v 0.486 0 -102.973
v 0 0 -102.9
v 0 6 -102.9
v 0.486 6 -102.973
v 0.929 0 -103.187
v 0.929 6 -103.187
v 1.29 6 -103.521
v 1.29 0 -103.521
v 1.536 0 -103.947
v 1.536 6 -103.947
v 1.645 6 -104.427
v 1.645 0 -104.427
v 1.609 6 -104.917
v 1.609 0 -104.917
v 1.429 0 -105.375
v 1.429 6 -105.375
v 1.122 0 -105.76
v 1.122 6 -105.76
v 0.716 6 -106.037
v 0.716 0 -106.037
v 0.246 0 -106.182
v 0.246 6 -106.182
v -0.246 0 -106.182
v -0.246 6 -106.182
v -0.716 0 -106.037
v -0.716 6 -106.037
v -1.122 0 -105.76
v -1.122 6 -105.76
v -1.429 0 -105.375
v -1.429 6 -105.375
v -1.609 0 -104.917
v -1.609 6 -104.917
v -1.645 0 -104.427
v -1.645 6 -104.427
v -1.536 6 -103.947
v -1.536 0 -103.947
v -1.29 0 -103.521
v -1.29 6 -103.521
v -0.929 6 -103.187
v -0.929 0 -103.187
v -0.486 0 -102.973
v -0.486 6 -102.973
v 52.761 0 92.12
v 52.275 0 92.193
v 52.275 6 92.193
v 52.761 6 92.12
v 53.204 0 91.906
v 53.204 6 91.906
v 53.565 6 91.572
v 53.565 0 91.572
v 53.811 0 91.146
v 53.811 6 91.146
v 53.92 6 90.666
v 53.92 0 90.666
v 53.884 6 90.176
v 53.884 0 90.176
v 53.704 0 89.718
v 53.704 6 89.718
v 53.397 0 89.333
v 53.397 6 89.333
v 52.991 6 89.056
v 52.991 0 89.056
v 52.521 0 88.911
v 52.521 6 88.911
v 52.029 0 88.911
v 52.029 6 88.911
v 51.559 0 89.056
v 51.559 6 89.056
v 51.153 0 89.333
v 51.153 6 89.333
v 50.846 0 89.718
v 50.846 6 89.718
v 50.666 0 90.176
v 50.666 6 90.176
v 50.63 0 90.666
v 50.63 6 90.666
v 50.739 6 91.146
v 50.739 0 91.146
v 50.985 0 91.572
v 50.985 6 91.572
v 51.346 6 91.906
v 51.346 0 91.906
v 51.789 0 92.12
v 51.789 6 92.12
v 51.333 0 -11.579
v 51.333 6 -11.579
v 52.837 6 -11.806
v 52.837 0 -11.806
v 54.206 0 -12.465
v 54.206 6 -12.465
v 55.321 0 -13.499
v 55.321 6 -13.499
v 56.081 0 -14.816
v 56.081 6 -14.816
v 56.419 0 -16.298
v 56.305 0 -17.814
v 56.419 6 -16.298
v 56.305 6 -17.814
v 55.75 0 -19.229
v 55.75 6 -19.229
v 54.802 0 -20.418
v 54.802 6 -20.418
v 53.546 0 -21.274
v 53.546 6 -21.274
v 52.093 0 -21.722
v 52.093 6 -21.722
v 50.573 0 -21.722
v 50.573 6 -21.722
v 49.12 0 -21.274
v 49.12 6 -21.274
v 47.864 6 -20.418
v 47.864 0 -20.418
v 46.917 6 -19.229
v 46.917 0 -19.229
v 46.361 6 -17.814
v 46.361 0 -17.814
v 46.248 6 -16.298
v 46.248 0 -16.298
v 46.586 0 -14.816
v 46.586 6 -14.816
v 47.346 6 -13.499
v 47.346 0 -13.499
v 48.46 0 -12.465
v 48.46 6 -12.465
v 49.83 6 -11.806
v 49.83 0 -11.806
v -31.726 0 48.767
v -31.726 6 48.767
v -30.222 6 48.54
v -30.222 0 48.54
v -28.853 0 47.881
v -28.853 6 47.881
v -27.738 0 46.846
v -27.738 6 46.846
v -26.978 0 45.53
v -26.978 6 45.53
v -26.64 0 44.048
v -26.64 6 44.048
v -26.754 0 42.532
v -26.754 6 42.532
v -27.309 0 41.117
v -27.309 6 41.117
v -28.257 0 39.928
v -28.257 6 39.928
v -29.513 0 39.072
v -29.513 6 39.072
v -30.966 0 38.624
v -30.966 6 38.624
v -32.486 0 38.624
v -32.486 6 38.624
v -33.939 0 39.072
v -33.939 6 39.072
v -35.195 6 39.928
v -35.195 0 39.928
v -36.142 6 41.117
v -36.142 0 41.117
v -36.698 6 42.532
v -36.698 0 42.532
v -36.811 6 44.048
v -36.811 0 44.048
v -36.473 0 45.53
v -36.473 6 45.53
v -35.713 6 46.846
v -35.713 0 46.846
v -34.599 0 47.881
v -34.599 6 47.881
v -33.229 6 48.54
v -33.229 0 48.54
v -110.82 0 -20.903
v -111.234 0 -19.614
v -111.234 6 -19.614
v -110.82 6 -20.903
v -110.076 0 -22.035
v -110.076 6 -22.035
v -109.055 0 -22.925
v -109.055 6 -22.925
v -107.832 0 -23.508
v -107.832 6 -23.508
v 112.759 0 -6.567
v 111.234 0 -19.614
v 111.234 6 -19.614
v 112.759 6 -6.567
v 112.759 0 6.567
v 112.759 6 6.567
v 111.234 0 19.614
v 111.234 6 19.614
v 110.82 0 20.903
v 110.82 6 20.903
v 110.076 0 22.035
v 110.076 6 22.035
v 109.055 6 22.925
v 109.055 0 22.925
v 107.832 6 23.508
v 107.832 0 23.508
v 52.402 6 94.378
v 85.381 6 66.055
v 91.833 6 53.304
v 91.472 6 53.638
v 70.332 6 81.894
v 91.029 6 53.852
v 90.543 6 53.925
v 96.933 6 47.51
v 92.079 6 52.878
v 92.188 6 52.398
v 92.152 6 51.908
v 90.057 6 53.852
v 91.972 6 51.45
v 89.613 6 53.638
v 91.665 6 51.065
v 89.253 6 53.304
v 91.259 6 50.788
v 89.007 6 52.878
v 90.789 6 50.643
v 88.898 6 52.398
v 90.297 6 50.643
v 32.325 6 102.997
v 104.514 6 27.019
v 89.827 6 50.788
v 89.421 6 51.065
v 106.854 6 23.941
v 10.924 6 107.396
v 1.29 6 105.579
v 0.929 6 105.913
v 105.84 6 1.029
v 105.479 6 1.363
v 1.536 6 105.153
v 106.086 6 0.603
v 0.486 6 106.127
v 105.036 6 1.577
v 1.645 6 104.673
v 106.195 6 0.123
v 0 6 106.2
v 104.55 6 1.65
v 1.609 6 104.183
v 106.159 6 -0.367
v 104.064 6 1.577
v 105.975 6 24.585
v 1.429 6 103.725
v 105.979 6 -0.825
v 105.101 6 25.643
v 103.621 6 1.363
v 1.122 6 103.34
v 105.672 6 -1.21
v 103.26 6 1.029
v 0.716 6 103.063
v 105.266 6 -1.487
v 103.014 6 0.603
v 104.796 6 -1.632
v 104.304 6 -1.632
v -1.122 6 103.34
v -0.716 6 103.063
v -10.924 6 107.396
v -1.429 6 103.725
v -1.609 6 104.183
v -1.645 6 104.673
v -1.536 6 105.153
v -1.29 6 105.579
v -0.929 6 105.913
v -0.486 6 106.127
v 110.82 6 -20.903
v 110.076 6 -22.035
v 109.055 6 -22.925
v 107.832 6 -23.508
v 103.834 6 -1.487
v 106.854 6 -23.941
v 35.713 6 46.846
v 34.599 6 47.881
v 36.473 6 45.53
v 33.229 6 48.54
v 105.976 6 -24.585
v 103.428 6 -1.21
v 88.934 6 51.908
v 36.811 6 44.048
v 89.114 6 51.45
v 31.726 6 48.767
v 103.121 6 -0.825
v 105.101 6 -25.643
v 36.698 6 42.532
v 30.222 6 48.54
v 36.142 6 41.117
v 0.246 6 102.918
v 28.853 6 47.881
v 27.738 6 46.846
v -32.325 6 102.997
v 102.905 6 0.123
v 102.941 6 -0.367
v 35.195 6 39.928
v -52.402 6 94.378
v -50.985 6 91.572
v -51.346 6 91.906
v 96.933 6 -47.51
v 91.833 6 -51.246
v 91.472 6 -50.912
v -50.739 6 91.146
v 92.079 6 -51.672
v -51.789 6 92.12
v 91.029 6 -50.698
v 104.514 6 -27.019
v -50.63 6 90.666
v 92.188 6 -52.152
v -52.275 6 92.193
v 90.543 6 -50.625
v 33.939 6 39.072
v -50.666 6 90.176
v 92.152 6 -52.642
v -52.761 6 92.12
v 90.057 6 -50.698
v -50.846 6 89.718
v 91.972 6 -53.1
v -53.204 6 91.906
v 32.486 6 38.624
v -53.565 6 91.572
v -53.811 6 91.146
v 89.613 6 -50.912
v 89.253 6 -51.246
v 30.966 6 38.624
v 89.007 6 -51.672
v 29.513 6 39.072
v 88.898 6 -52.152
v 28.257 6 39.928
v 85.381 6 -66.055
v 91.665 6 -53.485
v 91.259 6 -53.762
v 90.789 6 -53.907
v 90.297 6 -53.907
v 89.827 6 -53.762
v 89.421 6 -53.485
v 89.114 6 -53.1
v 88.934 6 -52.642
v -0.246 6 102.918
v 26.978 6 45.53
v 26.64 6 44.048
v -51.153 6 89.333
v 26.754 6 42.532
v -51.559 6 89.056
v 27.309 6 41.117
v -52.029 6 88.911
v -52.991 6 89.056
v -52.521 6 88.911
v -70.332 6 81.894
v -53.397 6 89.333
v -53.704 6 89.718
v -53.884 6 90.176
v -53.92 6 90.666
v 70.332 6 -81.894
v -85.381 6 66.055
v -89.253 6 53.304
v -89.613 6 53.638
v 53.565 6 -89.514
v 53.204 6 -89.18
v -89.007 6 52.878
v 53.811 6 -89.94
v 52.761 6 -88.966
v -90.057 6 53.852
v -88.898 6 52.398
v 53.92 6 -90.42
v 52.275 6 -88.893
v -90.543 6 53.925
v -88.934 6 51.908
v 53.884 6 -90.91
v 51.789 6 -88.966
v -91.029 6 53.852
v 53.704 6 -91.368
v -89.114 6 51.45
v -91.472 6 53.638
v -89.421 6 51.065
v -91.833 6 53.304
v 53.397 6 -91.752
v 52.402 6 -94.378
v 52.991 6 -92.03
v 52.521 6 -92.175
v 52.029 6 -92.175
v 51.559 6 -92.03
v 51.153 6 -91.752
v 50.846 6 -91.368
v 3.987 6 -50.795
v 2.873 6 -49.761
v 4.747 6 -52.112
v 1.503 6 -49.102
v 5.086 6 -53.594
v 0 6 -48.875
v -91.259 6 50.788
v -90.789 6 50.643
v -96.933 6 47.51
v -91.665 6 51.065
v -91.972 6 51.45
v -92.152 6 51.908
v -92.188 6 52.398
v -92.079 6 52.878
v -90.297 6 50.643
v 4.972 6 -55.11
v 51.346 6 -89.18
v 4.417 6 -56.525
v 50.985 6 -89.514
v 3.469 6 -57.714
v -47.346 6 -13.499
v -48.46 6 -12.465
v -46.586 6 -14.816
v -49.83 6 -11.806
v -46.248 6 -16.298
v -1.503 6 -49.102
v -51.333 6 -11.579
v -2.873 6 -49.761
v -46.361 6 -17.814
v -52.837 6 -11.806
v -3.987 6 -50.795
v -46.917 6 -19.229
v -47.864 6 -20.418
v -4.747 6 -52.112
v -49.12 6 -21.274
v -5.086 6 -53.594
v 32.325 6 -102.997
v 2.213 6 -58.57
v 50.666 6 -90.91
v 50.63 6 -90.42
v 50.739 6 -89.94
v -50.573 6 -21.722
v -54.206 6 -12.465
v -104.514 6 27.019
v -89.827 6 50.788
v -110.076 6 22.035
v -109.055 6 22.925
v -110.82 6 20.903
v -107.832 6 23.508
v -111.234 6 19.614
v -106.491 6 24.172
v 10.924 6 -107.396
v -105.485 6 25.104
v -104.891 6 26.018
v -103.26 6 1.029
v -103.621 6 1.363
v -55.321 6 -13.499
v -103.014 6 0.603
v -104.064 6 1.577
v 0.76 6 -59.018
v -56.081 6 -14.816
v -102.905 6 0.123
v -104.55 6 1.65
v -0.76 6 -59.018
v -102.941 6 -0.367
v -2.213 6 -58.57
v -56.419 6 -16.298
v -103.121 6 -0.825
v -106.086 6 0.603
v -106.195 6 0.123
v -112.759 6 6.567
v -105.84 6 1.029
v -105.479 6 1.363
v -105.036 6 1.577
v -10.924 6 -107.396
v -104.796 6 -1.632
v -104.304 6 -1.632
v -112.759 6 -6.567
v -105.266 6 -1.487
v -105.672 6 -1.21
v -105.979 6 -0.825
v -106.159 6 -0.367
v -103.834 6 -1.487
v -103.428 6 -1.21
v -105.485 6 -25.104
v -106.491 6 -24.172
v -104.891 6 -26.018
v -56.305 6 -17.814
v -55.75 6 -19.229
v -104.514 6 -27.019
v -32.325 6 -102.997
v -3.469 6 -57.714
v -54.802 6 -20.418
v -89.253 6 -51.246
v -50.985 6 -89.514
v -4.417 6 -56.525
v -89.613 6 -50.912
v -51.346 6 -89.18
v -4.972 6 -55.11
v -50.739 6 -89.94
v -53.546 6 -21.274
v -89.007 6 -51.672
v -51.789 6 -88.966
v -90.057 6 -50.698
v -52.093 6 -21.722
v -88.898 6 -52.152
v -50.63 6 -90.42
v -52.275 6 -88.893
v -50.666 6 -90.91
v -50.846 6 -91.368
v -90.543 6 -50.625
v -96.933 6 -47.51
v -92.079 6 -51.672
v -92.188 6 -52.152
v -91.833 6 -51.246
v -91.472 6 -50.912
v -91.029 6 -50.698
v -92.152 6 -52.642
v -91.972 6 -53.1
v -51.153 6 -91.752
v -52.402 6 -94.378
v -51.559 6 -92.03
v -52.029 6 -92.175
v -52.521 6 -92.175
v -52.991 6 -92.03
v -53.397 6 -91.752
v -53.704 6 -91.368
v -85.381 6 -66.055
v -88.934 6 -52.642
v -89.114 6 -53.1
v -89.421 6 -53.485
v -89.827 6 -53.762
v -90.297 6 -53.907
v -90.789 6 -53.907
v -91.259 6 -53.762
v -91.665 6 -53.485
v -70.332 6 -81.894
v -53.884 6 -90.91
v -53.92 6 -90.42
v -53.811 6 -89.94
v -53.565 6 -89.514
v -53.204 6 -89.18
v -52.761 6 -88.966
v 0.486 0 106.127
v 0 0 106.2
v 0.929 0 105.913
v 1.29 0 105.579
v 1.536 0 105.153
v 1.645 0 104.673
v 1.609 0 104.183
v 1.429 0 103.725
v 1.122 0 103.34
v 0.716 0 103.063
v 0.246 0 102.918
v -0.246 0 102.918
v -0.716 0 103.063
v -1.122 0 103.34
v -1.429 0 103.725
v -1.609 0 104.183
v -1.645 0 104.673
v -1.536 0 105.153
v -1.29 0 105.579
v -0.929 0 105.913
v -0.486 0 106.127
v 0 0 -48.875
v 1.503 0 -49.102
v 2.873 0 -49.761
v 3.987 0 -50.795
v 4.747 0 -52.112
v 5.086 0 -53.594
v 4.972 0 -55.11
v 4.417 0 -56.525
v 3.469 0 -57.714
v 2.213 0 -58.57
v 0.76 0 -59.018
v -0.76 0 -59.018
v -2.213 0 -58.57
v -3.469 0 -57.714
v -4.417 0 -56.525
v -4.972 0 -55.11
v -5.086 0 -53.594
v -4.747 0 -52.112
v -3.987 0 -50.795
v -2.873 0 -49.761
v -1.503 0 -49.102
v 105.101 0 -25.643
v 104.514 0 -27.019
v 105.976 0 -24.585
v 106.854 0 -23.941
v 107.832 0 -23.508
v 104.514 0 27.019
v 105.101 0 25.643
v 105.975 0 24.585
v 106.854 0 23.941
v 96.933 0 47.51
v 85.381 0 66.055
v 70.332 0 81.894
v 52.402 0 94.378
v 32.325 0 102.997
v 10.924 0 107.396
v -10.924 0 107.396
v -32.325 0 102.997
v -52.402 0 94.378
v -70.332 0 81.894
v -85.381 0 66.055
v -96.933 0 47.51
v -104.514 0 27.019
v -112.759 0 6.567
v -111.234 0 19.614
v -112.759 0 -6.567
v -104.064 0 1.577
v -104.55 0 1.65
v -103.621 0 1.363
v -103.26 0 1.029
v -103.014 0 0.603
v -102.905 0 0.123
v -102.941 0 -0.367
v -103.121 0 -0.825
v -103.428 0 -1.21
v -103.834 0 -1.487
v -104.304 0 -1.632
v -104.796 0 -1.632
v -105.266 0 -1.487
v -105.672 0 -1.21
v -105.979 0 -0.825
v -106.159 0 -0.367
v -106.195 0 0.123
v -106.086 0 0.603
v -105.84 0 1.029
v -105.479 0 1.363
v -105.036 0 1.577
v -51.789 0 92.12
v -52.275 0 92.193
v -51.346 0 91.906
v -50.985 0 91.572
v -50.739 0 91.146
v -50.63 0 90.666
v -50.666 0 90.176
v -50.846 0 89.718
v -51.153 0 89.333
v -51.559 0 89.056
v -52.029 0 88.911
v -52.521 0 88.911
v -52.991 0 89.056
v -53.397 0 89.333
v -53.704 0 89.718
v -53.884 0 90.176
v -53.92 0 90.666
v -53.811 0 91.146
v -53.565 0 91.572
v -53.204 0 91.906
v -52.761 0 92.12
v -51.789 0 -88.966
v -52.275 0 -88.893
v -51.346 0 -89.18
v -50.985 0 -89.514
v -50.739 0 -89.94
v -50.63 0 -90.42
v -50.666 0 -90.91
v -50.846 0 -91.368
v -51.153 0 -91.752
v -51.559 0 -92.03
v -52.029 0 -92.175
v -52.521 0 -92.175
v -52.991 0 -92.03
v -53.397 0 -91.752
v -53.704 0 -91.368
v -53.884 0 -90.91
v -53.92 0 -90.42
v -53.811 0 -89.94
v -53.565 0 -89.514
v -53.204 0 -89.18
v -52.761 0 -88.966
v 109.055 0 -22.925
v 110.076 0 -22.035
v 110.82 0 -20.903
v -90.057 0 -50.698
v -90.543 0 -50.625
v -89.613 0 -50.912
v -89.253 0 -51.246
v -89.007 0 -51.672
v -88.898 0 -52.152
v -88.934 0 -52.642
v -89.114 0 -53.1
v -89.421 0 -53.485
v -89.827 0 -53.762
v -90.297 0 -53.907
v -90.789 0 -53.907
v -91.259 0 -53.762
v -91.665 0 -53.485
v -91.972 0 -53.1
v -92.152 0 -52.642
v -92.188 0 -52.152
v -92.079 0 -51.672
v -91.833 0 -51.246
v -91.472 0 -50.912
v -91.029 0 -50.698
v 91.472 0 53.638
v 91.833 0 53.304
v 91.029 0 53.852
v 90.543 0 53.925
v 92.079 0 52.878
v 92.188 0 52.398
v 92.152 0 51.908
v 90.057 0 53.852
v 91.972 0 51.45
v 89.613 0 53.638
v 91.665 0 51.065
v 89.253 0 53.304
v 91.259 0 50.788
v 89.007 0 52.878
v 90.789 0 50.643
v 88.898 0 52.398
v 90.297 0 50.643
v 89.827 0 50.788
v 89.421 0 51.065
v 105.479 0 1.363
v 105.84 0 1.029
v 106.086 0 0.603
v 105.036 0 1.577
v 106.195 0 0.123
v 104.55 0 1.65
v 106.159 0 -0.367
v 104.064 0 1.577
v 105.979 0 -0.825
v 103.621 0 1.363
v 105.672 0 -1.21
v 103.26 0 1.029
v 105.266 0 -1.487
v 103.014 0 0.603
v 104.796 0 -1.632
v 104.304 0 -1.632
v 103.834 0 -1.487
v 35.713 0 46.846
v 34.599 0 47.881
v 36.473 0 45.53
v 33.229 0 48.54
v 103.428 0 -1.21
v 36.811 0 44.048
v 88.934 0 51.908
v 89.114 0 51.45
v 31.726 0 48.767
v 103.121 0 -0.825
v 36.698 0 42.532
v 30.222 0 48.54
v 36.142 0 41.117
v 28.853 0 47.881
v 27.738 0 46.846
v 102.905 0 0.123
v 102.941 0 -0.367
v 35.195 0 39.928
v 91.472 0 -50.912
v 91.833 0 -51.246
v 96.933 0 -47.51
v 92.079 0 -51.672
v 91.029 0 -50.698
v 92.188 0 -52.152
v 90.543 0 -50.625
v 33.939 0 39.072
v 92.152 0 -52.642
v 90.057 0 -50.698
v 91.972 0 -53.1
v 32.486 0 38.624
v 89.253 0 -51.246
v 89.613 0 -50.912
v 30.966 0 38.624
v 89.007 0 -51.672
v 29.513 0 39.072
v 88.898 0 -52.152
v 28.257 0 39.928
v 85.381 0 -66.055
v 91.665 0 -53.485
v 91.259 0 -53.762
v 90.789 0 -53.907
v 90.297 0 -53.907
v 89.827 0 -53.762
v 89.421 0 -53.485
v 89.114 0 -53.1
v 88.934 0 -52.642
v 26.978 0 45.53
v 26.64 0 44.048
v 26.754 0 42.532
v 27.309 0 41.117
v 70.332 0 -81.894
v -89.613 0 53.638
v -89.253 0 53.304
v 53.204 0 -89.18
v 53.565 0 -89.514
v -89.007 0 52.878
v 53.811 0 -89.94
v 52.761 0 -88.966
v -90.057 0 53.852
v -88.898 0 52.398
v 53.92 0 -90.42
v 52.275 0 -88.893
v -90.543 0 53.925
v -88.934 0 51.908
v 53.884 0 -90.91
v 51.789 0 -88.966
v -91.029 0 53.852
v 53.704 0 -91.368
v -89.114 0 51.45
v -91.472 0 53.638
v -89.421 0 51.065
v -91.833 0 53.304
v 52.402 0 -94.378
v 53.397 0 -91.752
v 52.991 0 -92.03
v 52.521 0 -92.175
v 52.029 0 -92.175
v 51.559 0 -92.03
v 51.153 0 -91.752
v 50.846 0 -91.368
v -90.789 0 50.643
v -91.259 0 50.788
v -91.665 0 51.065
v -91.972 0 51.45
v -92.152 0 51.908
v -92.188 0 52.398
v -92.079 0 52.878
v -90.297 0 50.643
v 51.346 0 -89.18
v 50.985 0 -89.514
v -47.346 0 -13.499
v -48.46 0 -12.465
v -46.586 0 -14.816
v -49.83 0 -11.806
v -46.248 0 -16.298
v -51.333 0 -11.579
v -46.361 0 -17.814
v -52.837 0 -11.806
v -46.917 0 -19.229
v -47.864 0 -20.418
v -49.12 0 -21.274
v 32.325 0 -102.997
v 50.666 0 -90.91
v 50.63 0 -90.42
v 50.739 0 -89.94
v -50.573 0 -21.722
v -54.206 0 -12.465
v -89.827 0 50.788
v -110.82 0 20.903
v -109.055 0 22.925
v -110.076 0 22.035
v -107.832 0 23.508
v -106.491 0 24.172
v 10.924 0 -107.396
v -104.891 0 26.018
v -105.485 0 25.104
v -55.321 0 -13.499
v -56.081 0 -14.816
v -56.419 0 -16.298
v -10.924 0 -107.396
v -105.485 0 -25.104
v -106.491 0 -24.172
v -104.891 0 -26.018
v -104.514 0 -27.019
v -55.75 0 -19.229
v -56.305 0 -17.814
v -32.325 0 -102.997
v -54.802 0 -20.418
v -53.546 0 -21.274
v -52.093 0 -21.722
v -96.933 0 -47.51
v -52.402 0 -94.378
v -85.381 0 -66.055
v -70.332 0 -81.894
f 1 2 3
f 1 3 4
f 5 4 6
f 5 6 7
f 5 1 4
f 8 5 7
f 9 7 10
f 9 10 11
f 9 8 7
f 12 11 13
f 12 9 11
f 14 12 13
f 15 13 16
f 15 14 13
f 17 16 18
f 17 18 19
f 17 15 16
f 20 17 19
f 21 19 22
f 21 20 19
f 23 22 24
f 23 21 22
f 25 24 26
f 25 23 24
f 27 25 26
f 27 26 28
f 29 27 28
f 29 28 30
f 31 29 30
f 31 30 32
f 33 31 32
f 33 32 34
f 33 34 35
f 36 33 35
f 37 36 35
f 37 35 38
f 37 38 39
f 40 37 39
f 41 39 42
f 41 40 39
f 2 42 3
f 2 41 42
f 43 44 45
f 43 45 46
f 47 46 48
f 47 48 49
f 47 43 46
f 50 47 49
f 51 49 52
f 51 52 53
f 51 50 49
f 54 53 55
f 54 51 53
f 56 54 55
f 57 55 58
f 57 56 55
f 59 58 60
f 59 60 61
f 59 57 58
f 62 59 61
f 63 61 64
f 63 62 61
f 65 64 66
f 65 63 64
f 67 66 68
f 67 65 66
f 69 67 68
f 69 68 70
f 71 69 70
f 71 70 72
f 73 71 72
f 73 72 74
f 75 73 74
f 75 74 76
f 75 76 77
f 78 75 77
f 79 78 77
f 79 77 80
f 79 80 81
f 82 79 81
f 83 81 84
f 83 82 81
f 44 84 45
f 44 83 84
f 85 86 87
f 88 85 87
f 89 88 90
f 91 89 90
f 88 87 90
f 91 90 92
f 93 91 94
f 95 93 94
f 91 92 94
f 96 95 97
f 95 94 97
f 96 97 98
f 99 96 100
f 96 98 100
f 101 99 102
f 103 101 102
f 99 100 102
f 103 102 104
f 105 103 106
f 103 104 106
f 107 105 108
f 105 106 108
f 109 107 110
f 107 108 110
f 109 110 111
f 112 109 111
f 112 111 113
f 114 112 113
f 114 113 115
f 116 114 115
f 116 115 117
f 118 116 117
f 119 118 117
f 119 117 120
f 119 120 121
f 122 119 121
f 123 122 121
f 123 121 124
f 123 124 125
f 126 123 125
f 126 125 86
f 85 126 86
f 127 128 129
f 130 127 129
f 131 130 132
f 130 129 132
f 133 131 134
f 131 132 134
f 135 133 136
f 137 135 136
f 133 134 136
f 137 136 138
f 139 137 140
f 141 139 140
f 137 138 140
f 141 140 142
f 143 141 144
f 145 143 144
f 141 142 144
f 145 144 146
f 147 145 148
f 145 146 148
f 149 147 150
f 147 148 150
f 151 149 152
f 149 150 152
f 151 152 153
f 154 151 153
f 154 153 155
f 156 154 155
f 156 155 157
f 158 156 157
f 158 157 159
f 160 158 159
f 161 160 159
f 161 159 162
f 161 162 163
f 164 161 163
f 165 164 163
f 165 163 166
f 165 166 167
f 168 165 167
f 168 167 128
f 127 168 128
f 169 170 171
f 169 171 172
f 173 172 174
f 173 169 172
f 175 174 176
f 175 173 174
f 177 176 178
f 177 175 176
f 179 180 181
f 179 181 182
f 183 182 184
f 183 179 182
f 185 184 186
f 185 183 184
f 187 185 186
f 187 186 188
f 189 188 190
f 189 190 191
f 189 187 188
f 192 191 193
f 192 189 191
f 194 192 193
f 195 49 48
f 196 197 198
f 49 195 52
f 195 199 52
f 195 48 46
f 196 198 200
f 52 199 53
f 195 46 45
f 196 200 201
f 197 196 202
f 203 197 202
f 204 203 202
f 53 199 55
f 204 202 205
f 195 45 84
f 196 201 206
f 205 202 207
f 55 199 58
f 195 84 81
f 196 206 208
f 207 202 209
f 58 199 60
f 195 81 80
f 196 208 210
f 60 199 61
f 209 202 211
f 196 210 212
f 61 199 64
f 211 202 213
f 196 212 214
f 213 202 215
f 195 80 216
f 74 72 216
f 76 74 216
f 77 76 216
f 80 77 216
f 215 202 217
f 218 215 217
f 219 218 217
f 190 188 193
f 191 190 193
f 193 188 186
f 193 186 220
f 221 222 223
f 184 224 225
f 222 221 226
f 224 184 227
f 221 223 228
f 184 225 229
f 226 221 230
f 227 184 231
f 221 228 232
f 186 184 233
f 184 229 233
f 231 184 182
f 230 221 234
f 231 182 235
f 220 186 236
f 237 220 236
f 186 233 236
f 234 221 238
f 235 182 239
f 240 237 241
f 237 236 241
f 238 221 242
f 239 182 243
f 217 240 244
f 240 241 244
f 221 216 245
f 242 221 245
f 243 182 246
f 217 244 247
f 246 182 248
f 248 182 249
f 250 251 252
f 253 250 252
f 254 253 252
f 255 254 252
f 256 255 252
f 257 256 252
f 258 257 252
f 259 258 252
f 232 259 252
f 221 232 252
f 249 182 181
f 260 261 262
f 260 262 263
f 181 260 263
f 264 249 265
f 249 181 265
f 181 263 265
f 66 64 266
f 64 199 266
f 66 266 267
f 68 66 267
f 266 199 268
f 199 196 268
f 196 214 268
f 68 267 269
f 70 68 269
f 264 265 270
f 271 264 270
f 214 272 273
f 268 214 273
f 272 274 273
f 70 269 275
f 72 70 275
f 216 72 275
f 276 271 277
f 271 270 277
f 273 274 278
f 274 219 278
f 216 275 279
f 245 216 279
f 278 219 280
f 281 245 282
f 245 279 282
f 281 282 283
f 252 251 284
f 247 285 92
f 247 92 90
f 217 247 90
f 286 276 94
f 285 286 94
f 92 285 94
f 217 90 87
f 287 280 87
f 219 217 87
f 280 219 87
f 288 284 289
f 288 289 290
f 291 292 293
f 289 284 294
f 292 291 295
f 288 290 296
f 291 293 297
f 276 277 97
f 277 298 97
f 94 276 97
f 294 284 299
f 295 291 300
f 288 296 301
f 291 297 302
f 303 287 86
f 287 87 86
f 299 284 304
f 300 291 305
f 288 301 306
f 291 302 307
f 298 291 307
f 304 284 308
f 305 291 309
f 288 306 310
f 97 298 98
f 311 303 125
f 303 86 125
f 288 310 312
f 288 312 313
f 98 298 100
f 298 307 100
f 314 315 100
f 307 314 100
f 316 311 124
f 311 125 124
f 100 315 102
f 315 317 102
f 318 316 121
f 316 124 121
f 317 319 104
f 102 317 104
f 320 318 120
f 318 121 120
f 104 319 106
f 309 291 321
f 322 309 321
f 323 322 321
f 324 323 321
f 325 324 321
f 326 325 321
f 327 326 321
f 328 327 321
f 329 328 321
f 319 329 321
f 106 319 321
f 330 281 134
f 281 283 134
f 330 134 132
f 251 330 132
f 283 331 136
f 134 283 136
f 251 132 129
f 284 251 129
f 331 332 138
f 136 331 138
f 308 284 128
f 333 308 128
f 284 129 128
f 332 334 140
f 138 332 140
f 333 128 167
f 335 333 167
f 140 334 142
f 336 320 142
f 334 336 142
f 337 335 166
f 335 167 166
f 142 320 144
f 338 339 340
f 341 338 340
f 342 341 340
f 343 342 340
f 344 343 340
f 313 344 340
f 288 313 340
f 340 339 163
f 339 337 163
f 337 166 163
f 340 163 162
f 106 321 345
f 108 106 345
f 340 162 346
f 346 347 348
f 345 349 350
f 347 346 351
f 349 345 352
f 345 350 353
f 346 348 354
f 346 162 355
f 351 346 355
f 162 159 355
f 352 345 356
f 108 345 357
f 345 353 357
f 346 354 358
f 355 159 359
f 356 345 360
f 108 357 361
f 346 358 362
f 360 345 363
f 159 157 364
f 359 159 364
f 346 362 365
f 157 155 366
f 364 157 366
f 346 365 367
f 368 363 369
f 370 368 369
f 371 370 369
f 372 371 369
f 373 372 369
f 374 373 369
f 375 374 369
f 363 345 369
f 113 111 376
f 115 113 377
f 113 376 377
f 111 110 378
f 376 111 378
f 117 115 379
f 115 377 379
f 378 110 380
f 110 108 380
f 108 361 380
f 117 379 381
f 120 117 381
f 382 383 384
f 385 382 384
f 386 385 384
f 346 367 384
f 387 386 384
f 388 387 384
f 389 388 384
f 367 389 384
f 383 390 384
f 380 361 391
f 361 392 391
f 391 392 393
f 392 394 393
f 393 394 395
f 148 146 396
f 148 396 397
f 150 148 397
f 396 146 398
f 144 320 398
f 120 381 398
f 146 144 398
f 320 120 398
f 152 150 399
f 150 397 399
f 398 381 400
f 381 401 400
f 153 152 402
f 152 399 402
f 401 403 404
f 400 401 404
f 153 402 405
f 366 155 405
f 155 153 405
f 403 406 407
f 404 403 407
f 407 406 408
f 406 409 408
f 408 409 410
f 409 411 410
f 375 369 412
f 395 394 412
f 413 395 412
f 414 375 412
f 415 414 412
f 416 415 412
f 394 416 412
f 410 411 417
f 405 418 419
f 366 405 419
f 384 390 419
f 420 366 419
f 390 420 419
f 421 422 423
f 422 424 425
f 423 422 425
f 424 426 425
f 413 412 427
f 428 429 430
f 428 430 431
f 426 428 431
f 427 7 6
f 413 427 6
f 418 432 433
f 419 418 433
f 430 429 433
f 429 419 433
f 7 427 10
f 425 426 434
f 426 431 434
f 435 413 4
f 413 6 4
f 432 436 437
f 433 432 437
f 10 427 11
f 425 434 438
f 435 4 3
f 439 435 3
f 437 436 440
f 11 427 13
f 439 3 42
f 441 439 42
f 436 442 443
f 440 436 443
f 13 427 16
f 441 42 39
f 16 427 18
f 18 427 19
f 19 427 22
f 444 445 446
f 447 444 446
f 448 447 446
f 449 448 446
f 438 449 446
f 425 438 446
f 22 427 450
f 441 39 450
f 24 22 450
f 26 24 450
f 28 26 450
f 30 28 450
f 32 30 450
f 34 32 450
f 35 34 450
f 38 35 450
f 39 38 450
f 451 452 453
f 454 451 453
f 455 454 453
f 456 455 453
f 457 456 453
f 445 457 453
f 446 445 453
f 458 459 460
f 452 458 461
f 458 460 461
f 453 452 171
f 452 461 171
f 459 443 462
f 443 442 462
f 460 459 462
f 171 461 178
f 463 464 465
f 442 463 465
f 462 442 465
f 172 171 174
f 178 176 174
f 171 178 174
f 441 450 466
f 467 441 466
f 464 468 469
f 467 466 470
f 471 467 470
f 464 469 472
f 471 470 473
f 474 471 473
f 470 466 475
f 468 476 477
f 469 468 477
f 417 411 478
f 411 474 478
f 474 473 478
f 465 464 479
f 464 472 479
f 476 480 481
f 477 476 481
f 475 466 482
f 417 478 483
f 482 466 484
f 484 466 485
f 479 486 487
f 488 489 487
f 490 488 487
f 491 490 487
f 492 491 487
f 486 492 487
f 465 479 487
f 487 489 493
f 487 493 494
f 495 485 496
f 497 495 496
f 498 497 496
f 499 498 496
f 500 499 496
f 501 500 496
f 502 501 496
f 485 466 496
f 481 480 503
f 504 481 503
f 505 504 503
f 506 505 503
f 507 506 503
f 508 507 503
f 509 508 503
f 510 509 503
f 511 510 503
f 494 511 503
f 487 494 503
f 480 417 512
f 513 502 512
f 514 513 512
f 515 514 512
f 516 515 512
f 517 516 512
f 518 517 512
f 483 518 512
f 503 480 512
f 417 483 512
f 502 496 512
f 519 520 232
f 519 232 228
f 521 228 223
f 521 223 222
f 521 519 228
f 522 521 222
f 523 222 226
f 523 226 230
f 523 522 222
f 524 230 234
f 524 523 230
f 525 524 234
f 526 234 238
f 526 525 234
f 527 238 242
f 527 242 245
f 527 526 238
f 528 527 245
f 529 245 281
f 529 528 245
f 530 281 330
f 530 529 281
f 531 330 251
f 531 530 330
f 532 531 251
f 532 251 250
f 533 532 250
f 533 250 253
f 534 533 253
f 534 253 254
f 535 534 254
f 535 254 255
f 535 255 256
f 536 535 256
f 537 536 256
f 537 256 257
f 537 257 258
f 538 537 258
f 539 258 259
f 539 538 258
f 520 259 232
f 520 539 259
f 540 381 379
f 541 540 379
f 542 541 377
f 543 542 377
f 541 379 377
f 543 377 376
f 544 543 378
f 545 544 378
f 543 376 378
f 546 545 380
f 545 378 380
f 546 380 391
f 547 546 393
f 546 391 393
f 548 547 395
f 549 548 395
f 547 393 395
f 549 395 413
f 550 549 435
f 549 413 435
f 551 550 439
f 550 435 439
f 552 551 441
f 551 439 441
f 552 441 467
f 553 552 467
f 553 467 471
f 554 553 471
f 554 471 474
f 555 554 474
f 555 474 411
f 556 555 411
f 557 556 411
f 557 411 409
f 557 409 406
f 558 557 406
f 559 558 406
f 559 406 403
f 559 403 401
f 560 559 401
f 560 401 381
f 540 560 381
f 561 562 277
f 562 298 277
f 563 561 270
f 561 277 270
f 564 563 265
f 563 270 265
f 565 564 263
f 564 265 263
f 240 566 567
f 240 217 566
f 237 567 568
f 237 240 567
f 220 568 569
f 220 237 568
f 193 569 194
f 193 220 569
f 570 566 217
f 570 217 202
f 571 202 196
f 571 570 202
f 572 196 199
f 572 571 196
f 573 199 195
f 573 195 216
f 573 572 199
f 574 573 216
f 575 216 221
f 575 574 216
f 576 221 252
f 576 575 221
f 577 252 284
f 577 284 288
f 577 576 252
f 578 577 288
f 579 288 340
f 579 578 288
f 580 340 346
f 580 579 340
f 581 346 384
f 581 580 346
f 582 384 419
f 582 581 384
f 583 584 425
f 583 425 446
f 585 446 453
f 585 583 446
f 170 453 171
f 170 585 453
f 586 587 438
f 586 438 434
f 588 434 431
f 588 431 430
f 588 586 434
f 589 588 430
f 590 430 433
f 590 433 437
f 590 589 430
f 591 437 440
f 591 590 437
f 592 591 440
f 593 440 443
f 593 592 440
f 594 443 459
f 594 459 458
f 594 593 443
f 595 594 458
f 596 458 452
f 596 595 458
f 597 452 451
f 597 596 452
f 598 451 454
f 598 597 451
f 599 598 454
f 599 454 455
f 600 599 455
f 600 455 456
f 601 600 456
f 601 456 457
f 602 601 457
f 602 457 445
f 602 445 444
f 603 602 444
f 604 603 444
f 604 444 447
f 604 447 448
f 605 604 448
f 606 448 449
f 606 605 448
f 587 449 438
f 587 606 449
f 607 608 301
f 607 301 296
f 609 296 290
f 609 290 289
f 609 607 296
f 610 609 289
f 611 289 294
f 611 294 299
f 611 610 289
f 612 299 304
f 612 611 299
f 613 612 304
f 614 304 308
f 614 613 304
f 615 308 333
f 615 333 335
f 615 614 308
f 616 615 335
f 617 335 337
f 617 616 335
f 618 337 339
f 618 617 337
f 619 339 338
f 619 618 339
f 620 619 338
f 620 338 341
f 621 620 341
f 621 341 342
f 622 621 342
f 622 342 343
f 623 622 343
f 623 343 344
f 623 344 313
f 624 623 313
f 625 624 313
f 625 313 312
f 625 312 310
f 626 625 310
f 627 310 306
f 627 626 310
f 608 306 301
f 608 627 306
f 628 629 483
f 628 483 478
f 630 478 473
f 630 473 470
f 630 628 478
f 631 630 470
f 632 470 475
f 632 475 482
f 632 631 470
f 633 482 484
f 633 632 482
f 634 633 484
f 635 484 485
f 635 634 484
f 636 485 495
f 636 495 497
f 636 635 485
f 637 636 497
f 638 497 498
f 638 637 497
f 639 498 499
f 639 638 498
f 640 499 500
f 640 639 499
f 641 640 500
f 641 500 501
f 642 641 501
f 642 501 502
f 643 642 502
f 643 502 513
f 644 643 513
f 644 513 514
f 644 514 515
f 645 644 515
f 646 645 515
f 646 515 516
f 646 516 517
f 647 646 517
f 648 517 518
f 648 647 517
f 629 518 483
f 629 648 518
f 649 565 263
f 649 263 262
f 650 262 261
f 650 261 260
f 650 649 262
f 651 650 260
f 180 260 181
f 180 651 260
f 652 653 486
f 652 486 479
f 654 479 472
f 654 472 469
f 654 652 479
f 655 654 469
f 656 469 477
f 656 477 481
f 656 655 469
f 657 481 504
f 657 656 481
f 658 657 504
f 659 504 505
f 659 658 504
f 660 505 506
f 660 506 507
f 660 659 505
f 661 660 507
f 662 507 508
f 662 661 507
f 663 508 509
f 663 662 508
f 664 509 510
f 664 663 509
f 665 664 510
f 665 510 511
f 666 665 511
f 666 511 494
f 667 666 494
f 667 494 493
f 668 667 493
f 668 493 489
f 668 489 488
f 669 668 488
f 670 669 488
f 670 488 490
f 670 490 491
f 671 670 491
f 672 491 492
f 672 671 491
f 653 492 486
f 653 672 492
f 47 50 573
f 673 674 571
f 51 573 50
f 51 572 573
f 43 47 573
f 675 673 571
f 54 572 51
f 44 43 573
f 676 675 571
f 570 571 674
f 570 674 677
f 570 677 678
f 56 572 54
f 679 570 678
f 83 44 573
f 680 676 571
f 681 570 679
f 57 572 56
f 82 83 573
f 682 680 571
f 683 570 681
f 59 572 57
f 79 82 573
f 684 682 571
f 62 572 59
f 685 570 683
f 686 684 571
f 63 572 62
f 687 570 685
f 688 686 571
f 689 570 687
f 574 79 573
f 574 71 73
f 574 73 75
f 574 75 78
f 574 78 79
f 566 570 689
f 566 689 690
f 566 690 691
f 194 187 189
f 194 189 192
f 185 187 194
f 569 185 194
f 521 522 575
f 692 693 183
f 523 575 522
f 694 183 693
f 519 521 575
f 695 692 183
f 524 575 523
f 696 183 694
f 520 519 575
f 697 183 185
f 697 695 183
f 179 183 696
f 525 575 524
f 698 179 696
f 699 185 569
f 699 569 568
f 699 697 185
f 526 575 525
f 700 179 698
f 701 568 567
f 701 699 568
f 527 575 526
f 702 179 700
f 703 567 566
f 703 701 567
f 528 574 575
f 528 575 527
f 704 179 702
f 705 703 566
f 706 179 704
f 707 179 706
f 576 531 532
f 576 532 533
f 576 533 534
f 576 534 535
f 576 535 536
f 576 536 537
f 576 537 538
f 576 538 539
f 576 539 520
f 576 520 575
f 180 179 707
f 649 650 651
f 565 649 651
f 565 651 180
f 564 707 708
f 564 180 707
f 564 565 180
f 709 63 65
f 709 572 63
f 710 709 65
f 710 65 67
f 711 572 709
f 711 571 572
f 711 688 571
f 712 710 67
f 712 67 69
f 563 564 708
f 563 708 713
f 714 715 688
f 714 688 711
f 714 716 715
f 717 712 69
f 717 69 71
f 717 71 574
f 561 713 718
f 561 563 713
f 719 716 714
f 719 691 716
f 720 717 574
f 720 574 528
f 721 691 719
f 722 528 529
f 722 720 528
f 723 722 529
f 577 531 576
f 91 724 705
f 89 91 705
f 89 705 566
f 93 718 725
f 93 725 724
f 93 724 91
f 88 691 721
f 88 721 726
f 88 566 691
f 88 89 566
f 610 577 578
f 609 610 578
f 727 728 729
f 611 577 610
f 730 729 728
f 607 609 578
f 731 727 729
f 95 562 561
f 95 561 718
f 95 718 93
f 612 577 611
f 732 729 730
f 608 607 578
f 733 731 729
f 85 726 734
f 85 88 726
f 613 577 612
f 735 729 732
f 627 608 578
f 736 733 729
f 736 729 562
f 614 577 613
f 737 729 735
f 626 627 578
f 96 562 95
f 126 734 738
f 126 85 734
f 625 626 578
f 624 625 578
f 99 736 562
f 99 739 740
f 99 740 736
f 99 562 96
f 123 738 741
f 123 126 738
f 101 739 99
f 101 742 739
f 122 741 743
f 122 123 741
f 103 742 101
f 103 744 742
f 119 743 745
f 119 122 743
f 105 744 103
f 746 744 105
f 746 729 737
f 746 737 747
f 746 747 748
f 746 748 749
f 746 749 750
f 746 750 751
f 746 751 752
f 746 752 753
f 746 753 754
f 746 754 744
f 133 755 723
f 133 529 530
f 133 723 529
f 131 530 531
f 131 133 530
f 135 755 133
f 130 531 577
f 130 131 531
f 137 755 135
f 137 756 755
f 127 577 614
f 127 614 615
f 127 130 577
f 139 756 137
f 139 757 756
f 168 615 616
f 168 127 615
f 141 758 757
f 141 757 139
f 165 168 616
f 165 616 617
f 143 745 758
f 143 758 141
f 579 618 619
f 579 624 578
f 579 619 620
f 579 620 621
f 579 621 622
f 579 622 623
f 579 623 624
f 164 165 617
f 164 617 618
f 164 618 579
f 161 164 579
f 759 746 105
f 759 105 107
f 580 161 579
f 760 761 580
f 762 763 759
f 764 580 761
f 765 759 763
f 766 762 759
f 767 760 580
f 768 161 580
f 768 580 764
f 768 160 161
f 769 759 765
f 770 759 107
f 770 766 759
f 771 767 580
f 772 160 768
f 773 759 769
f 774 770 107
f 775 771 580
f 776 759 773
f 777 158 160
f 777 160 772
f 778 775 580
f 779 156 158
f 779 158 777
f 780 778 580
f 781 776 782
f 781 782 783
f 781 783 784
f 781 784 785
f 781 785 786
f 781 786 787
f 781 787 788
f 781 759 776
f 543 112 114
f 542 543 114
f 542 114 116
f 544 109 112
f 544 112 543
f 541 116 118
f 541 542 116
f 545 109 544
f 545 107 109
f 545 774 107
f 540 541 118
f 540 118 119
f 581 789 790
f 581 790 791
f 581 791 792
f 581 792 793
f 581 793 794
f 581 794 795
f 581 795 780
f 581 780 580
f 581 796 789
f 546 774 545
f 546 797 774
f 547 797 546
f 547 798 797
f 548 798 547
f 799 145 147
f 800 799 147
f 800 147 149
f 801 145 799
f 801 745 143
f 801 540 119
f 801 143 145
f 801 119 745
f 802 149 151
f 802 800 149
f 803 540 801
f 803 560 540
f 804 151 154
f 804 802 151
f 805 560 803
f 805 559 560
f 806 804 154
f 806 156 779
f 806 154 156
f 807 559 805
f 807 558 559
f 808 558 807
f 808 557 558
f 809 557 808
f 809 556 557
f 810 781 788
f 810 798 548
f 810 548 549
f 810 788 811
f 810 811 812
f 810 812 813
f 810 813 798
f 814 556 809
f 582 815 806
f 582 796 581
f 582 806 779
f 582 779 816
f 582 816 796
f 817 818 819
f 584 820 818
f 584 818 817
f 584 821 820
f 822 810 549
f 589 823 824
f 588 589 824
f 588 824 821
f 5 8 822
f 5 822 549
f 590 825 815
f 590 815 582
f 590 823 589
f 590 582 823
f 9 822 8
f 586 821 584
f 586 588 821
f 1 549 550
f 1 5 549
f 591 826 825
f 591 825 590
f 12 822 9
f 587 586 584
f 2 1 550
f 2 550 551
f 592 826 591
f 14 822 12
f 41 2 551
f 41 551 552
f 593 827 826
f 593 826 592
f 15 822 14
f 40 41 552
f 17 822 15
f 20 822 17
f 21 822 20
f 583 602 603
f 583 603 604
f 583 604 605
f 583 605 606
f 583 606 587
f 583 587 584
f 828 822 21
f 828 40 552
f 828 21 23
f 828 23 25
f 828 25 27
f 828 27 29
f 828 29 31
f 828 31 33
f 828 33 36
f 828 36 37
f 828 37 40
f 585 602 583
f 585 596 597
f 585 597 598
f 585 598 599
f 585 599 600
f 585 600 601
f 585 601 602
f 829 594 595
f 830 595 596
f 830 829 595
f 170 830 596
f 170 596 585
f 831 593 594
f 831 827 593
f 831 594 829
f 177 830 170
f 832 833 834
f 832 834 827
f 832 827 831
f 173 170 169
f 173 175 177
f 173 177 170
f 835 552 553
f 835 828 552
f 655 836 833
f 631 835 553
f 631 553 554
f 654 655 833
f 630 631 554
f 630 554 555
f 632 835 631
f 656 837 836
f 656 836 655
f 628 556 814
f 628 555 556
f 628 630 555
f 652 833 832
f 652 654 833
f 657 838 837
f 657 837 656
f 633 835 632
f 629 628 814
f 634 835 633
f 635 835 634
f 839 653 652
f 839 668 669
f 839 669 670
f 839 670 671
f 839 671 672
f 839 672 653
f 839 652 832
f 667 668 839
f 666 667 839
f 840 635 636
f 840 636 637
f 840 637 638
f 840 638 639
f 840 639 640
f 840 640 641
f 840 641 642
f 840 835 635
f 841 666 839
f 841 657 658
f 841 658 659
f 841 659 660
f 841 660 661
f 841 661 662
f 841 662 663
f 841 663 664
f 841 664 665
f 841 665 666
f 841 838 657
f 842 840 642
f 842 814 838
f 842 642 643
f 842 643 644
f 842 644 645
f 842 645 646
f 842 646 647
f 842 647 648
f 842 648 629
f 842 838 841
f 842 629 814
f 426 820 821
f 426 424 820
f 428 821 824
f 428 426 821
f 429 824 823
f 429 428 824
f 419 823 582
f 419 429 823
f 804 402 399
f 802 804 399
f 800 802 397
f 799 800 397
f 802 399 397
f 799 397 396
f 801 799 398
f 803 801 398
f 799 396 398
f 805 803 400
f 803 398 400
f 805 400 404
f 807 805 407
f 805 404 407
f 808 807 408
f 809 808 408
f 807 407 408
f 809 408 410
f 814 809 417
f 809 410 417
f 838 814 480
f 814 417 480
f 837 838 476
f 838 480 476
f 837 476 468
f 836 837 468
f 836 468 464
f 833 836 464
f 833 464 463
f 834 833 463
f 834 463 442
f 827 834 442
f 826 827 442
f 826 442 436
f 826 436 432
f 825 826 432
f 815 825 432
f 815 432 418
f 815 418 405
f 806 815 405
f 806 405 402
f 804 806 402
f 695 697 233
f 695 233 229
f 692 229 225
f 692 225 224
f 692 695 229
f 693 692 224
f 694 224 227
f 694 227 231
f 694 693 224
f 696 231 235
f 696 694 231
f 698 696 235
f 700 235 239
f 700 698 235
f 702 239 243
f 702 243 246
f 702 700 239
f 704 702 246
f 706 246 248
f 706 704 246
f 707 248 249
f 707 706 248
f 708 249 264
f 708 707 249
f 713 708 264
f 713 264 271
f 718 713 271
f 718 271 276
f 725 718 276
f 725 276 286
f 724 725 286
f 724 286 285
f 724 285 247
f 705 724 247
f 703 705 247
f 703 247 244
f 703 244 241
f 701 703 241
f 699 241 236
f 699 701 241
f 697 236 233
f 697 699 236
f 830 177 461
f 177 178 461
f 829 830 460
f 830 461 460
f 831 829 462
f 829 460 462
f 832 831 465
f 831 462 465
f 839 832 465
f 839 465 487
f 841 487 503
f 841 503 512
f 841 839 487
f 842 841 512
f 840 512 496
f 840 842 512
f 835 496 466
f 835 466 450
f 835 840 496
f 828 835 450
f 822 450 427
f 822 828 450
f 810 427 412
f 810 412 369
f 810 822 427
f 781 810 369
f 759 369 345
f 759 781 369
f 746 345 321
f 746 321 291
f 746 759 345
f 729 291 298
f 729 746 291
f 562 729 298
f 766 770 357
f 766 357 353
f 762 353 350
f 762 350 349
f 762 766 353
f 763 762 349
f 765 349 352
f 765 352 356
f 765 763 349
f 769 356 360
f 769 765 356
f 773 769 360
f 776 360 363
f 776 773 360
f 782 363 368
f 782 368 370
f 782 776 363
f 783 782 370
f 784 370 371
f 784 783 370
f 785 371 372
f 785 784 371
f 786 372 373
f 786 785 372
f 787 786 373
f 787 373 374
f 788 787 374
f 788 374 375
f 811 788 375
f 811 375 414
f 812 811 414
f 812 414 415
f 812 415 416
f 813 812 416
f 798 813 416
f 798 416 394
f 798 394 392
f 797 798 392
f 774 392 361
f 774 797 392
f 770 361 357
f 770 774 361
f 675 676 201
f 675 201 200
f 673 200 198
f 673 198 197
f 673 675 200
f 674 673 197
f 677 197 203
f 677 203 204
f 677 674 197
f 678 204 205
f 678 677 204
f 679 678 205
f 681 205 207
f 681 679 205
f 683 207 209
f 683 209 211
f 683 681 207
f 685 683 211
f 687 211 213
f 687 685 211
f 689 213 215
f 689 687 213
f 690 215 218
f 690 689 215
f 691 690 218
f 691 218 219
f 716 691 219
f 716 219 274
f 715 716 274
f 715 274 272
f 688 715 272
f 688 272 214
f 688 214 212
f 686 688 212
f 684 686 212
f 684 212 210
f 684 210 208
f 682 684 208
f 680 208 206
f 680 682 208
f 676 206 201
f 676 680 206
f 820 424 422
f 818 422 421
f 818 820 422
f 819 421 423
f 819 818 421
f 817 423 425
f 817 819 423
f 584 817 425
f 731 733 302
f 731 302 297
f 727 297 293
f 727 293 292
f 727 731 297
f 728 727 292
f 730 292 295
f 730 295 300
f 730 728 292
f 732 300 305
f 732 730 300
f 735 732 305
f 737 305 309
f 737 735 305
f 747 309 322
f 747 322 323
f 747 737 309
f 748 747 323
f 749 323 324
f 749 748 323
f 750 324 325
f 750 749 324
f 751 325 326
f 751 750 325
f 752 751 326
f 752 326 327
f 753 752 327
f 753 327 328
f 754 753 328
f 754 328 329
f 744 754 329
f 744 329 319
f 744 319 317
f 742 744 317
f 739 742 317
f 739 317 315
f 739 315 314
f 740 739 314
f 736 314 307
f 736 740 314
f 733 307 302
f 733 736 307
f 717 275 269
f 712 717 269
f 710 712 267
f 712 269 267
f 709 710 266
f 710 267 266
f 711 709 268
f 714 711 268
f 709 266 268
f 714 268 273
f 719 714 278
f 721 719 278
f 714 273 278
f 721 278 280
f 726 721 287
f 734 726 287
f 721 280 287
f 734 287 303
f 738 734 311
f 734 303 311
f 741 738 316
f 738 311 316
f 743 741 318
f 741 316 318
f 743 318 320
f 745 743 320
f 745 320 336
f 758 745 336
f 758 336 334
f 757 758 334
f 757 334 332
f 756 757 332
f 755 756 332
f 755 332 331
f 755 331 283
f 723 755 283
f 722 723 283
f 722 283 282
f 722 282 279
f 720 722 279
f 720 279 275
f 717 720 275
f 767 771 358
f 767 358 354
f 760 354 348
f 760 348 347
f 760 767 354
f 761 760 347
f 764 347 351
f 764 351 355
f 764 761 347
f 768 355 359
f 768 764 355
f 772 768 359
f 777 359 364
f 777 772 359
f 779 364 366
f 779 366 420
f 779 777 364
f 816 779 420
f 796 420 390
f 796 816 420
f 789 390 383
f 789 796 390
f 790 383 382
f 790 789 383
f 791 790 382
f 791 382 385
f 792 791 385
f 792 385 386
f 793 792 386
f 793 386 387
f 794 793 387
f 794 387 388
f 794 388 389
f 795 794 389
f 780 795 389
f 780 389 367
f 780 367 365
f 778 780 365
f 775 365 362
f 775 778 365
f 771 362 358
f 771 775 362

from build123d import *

# Parameters (mm, degrees)
SKETCH1_R           = 1.65
BOSS_EXTRUDE1_DEPTH = 6
FILLET1_R           = 5
SKETCH2_R           = 5.1
CUT_EXTRUDE1_DEPTH  = 157.355060824


with BuildPart() as part:
    # Sketch1 → Boss-Extrude1 (new body)
    with BuildSketch(Plane(origin=(0, 0, 0), x_dir=(1, 0, 0), z_dir=(0, 1, 0))):
        with BuildLine():
            ThreePointArc((-111.234035703, -19.613561667), (-112.95, 0), (-111.234035703, 19.613561667))
            ThreePointArc((-111.234035703, 19.613561667), (-109.13025705, 22.87401705), (-105.327953741, 23.647931427))
            ThreePointArc((-105.327953741, 23.647931427), (0, 107.95), (105.327953741, 23.647931427))
            ThreePointArc((105.327953741, 23.647931427), (109.13025705, 22.87401705), (111.234035703, 19.613561667))
            ThreePointArc((111.234035703, 19.613561667), (112.95, 0), (111.234035703, -19.613561667))
            ThreePointArc((111.234035703, -19.613561667), (109.13025705, -22.87401705), (105.327953741, -23.647931427))
            ThreePointArc((105.327953741, -23.647931427), (0, -107.95), (-105.327953741, -23.647931427))
            ThreePointArc((-105.327953741, -23.647931427), (-109.13025705, -22.87401705), (-111.234035703, -19.613561667))
        make_face()
        with Locations(Location((0, 104.55, 0), (0, 0, 270))):
            Circle(SKETCH1_R, mode=Mode.SUBTRACT)
        with Locations(Location((52.275, 90.542955966, 0), (0, 0, 270))):
            Circle(SKETCH1_R, mode=Mode.SUBTRACT)
        with Locations(Location((90.542955966, 52.275, 0), (0, 0, 270))):
            Circle(SKETCH1_R, mode=Mode.SUBTRACT)
        with Locations(Location((104.55, 0, 0), (0, 0, 270))):
            Circle(SKETCH1_R, mode=Mode.SUBTRACT)
        with Locations(Location((90.542955966, -52.275, 0), (0, 0, 270))):
            Circle(SKETCH1_R, mode=Mode.SUBTRACT)
        with Locations(Location((52.275, -90.542955966, 0), (0, 0, 270))):
            Circle(SKETCH1_R, mode=Mode.SUBTRACT)
        with Locations(Location((0, -104.55, 0), (0, 0, 270))):
            Circle(SKETCH1_R, mode=Mode.SUBTRACT)
        with Locations(Location((-52.275, -90.542955966, 0), (0, 0, 270))):
            Circle(SKETCH1_R, mode=Mode.SUBTRACT)
        with Locations(Location((-90.542955966, -52.275, 0), (0, 0, 270))):
            Circle(SKETCH1_R, mode=Mode.SUBTRACT)
        with Locations(Location((-104.55, 0, 0), (0, 0, 270))):
            Circle(SKETCH1_R, mode=Mode.SUBTRACT)
        with Locations(Location((-90.542955966, 52.275, 0), (0, 0, 270))):
            Circle(SKETCH1_R, mode=Mode.SUBTRACT)
        with Locations(Location((-52.275, 90.542955966, 0), (0, 0, 270))):
            Circle(SKETCH1_R, mode=Mode.SUBTRACT)
    extrude(amount=BOSS_EXTRUDE1_DEPTH)

    # Fillet1
    fillet1_edges = [part.edges().sort_by_distance(p)[0] for p in [
        (-105.327953741, 3, -23.647931427),
        (105.327953741, 3, -23.647931427),
        (105.327953741, 3, 23.647931427),
        (-105.327953741, 3, 23.647931427),
    ]]
    fillet(fillet1_edges, radius=FILLET1_R)

    # Sketch2 → Cut-Extrude1 (cut, through all)
    with BuildSketch(Plane(origin=(0, 6, 0), x_dir=(1, 0, 0), z_dir=(0, 1, 0))):
        with Locations(Location((0, 53.975, 0), (0, 0, 270))):
            Circle(SKETCH2_R)
        with Locations(Location((51.333275467, 16.679192271, 0), (0, 0, 270))):
            Circle(SKETCH2_R)
        with Locations(Location((31.725708992, -43.666692271, 0), (0, 0, 270))):
            Circle(SKETCH2_R)
        with Locations(Location((-31.725708992, -43.666692271, 0), (0, 0, 270))):
            Circle(SKETCH2_R)
        with Locations(Location((-51.333275467, 16.679192271, 0), (0, 0, 270))):
            Circle(SKETCH2_R)
    extrude(amount=-CUT_EXTRUDE1_DEPTH, mode=Mode.SUBTRACT)


solid = part.part
